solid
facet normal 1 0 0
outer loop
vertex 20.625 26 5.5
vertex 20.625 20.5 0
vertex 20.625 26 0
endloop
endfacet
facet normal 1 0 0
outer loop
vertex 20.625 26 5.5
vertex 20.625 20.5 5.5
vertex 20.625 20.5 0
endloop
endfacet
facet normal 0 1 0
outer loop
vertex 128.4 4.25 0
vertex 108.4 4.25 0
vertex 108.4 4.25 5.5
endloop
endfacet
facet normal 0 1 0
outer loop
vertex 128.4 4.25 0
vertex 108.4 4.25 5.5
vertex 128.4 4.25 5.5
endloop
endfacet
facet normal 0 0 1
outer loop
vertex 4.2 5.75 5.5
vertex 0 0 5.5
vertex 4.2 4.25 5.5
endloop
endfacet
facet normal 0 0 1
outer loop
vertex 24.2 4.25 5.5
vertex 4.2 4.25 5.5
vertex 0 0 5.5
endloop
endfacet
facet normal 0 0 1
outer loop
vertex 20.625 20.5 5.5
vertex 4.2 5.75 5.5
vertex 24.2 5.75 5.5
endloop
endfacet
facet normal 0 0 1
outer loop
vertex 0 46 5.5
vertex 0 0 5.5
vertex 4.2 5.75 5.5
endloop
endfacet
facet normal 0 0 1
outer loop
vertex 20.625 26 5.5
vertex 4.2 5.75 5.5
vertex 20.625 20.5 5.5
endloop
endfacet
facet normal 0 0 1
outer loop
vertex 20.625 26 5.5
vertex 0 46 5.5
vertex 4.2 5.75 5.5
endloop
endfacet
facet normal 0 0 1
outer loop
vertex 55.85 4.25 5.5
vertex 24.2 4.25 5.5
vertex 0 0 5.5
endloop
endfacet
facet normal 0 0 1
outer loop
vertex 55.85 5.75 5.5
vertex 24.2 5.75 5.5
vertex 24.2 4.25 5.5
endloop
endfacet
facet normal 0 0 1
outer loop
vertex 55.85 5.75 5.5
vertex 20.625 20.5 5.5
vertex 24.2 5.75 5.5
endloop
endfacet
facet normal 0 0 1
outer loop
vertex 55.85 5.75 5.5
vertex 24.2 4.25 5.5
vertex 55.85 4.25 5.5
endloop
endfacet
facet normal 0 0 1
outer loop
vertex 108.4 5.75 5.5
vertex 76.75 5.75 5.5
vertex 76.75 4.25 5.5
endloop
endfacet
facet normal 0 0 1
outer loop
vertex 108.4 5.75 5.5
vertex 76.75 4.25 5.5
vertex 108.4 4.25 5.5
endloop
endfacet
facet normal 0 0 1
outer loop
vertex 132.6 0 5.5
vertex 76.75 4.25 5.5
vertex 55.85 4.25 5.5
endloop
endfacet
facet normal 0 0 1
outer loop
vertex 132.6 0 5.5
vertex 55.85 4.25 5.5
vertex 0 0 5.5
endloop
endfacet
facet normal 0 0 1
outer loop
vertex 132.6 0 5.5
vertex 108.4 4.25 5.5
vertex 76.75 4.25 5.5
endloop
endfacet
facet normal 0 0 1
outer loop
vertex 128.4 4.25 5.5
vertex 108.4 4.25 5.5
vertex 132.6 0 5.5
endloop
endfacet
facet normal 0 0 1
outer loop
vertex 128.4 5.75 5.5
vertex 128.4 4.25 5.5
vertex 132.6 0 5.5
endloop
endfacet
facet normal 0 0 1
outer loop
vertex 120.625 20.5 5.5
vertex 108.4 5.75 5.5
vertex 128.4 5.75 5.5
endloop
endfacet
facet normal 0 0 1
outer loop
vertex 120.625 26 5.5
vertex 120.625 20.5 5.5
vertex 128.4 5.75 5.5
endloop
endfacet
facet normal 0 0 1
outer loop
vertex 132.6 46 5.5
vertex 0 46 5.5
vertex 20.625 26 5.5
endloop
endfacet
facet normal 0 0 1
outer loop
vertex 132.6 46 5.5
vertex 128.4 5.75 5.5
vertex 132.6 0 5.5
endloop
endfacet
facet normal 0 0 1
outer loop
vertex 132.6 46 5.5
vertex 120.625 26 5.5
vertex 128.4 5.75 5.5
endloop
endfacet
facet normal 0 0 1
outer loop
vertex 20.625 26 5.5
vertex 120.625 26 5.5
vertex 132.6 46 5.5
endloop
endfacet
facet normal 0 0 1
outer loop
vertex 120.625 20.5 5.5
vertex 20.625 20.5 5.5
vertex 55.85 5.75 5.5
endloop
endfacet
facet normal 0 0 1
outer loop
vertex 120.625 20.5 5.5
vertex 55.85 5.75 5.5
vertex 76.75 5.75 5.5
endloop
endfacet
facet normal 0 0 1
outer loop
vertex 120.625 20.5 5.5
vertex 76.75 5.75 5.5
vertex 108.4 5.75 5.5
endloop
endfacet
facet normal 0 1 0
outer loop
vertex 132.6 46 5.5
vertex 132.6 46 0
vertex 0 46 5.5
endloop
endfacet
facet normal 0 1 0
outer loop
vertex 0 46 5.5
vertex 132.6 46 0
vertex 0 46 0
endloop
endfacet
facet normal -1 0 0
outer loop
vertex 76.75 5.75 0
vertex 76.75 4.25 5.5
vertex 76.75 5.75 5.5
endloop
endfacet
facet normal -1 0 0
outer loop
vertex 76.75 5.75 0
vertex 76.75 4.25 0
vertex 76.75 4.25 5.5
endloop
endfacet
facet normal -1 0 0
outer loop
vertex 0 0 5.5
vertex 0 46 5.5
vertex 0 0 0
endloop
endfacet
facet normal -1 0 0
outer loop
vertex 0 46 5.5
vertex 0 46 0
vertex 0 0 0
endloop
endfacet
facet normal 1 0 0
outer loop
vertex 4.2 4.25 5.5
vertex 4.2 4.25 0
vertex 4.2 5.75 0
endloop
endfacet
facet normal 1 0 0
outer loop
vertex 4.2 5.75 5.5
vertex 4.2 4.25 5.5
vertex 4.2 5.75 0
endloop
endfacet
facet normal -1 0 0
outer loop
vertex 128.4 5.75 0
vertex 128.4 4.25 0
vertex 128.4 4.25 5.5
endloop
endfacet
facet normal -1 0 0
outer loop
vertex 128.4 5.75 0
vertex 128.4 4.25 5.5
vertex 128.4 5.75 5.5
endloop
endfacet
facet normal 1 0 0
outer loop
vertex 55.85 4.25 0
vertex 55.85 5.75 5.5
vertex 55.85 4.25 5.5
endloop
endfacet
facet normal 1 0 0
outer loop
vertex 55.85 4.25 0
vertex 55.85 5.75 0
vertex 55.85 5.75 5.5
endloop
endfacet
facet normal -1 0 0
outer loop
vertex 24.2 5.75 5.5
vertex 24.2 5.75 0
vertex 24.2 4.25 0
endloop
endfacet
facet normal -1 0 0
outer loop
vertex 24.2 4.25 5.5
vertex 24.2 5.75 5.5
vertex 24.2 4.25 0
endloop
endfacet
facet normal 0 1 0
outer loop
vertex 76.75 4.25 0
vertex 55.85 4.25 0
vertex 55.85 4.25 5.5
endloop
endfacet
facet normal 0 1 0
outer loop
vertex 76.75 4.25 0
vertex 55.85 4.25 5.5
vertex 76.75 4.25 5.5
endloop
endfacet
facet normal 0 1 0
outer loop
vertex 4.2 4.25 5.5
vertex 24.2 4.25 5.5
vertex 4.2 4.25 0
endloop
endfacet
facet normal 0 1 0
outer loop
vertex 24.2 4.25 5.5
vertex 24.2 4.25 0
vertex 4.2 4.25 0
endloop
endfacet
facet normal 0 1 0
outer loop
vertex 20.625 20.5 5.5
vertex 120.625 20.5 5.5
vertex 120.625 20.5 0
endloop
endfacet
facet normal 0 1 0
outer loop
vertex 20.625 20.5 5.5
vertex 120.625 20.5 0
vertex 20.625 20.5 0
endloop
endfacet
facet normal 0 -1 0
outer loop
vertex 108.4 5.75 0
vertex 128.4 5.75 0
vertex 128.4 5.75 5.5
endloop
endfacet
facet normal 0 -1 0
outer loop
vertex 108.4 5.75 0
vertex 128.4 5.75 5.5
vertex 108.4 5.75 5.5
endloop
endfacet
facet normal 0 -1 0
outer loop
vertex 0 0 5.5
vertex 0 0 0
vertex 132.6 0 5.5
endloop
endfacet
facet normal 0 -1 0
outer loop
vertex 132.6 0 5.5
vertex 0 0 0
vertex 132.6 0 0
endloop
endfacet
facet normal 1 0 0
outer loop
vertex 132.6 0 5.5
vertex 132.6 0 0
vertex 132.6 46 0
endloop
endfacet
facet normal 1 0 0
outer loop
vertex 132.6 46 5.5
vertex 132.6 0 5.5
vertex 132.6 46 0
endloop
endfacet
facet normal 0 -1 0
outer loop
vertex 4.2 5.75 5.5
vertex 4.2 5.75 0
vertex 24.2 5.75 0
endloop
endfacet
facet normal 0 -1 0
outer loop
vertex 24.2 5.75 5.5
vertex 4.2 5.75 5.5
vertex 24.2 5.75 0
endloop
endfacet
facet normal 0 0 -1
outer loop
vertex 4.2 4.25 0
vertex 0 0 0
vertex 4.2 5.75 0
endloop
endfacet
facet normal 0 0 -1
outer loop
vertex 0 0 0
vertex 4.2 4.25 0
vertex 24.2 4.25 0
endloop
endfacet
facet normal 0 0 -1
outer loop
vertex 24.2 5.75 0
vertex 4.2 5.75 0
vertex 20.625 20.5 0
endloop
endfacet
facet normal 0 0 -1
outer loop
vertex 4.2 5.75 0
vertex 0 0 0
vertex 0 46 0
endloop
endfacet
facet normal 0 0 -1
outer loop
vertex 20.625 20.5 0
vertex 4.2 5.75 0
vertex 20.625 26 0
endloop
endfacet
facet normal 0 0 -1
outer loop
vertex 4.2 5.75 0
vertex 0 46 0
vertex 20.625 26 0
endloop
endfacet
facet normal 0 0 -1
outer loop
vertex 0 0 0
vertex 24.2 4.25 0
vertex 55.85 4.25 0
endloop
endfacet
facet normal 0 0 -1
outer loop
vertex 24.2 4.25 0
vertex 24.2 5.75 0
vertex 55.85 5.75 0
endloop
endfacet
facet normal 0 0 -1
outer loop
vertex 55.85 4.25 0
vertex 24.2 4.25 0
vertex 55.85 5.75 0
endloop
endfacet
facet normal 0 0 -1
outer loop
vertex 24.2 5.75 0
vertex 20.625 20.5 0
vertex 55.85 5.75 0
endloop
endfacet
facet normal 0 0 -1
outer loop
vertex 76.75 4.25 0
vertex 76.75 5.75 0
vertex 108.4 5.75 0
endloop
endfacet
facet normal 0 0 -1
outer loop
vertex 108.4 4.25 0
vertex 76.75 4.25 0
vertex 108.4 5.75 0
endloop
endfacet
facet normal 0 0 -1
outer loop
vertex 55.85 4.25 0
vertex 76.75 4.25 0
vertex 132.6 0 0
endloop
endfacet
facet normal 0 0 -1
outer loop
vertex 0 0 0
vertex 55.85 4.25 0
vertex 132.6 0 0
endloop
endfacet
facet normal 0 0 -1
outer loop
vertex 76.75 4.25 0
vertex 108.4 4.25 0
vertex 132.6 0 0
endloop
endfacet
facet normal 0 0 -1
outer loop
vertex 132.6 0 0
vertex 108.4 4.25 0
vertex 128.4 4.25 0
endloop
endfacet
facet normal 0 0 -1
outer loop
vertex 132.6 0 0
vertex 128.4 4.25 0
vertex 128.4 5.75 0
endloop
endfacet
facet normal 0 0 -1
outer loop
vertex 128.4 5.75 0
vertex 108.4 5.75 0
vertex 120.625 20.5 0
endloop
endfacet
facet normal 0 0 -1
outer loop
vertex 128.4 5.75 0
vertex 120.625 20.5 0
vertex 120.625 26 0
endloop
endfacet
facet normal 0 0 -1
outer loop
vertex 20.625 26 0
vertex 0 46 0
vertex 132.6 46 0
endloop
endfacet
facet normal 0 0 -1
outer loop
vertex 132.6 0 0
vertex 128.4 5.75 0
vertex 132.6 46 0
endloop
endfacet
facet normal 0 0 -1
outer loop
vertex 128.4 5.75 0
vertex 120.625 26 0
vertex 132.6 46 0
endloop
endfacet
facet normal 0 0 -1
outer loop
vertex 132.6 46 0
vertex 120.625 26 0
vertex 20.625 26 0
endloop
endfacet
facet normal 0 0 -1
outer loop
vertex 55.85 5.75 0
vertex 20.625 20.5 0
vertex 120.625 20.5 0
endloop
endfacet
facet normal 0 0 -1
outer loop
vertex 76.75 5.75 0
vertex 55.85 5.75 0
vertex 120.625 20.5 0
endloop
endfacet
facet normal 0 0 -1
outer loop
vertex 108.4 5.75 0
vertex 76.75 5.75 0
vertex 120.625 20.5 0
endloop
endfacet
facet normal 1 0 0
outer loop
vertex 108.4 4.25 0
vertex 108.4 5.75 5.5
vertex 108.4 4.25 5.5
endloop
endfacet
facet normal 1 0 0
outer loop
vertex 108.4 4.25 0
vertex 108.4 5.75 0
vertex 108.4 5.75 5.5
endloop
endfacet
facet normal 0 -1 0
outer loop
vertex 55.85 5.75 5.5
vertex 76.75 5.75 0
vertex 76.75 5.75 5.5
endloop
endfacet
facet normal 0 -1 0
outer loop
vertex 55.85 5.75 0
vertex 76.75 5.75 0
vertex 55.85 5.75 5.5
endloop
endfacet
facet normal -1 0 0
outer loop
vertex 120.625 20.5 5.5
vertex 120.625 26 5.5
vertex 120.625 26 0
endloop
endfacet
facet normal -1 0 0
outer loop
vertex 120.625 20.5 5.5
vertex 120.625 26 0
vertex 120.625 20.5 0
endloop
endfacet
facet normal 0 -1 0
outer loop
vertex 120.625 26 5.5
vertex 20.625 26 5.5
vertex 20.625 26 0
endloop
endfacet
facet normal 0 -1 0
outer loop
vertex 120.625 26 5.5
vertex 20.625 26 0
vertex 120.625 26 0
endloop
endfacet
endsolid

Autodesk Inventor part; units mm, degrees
ref_plane "YZ Plane" through (0, 0, 0) normal (1, 0, 0) x (0, 1, 0)
sketch "Sketch1" plane through (0, 0, 0) normal (0, 0, 1) x (1, 0, 0)
  line L0 (0, 0) -> (132.6, 0)
  line L1 (132.6, 0) -> (132.6, 46)
  line L2 (132.6, 46) -> (0, 46)
  line L3 (0, 46) -> (0, 0)
  line L4 (66.3, 46) -> (66.3, 0) construction
  line L5 (55.85, 4.25) -> (76.75, 4.25)
  line L6 (76.75, 4.25) -> (76.75, 5.75)
  line L7 (76.75, 5.75) -> (55.85, 5.75)
  line L8 (55.85, 5.75) -> (55.85, 4.25)
  line L9 (55.85, 4.25) -> (76.75, 5.75) construction
  line L10 (76.75, 4.25) -> (55.85, 5.75) construction
  line L11 (4.2, 5.75) -> (24.2, 5.75)
  line L12 (24.2, 5.75) -> (24.2, 4.25)
  line L13 (24.2, 4.25) -> (4.2, 4.25)
  line L14 (4.2, 4.25) -> (4.2, 5.75)
  line L15 (4.2, 5.75) -> (24.2, 4.25) construction
  line L16 (24.2, 5.75) -> (4.2, 4.25) construction
  line L17 (108.4, 4.25) -> (128.4, 4.25)
  line L18 (128.4, 4.25) -> (128.4, 5.75)
  line L19 (128.4, 5.75) -> (108.4, 5.75)
  line L20 (108.4, 5.75) -> (108.4, 4.25)
  line L21 (108.4, 4.25) -> (128.4, 5.75) construction
  line L22 (128.4, 4.25) -> (108.4, 5.75) construction
  line L23 (14.2, 5) -> (118.4, 5) construction
  point P0 (66.3, 5)
  point P1 (66.3, 5)
  dimension "d0" = 132.6
  dimension "d1" = 46
  dimension "d2" = 1.5
  dimension "d3" = 20.9
  dimension "d4" = 1.5
  dimension "d5" = 20
  dimension "d7" = 20
  dimension "d8" = 1.5
  dimension "d17" = 5
  dimension "d18" = 52.1
extrude "Extrusion1" add sketch "Sketch1" along normal blind 5.5
ref_plane "Work Plane1" through (0, 23, 0) normal (0, 1, 0) x (1, 0, 0)
ref_plane "Work Plane2" through (66.3, 0, 0) normal (1, 0, 0) x (0, 0, -1)
ref_plane "Work Plane3" through (4.2, 5, 0) normal (0, 1, 0) x (1, 0, 0)
sketch "Sketch3" plane through (0, 0, 5.5) normal (0, 0, 1) x (1, 0, 0)
  line L0 (20.6246, 26) -> (120.6246, 26)
  line L1 (120.6246, 26) -> (120.6246, 20.5)
  line L2 (120.6246, 20.5) -> (20.6246, 20.5)
  line L3 (20.6246, 20.5) -> (20.6246, 26)
  line L4 (132.6, 46) -> (0, 46) projected
  point P0 (0, 0)
  dimension "d19" = 100
  dimension "d20" = 5.5
  dimension "d21" = 20
extrude "Extrusion2" cut sketch "Sketch3" against normal blind 5.5
equation "\"d3\" = lrmid + toler"
equation "\"d4\" = d2"
equation "\"d5\" = lrlr + toler"
equation "\"d7\" = d5"
equation "\"d8\" = d2"
equation "\"d18\" = lrbetween"
equation "\"thick\" = 0.5"
equation "\"lrlr\" = 19"
equation "\"lrmid\" = 19.9"
equation "\"lrdepth\" = 3.3"
equation "\"mlr\" = 16.6"
equation "\"mmid\" = 24.7"
equation "\"mdepth\" = 4.5"
equation "\"lrltotal\" = 126.6"
equation "\"mltotal\" = 126.6"
equation "\"lrbetween\" = 52.1"
equation "\"mbetween\" = 49.5"
equation "\"toler\" = 1"
equation "\"stuckw\" = 6"
equation "\"tight\" = 0.08"
equation "\"sidewallL\" = 132.6"
equation "\"heaterH\" = 117.3"
equation "\"stickL\" = 3.5"
equation "\"wireH\" = 25"
properties part number "lr_bottom"
